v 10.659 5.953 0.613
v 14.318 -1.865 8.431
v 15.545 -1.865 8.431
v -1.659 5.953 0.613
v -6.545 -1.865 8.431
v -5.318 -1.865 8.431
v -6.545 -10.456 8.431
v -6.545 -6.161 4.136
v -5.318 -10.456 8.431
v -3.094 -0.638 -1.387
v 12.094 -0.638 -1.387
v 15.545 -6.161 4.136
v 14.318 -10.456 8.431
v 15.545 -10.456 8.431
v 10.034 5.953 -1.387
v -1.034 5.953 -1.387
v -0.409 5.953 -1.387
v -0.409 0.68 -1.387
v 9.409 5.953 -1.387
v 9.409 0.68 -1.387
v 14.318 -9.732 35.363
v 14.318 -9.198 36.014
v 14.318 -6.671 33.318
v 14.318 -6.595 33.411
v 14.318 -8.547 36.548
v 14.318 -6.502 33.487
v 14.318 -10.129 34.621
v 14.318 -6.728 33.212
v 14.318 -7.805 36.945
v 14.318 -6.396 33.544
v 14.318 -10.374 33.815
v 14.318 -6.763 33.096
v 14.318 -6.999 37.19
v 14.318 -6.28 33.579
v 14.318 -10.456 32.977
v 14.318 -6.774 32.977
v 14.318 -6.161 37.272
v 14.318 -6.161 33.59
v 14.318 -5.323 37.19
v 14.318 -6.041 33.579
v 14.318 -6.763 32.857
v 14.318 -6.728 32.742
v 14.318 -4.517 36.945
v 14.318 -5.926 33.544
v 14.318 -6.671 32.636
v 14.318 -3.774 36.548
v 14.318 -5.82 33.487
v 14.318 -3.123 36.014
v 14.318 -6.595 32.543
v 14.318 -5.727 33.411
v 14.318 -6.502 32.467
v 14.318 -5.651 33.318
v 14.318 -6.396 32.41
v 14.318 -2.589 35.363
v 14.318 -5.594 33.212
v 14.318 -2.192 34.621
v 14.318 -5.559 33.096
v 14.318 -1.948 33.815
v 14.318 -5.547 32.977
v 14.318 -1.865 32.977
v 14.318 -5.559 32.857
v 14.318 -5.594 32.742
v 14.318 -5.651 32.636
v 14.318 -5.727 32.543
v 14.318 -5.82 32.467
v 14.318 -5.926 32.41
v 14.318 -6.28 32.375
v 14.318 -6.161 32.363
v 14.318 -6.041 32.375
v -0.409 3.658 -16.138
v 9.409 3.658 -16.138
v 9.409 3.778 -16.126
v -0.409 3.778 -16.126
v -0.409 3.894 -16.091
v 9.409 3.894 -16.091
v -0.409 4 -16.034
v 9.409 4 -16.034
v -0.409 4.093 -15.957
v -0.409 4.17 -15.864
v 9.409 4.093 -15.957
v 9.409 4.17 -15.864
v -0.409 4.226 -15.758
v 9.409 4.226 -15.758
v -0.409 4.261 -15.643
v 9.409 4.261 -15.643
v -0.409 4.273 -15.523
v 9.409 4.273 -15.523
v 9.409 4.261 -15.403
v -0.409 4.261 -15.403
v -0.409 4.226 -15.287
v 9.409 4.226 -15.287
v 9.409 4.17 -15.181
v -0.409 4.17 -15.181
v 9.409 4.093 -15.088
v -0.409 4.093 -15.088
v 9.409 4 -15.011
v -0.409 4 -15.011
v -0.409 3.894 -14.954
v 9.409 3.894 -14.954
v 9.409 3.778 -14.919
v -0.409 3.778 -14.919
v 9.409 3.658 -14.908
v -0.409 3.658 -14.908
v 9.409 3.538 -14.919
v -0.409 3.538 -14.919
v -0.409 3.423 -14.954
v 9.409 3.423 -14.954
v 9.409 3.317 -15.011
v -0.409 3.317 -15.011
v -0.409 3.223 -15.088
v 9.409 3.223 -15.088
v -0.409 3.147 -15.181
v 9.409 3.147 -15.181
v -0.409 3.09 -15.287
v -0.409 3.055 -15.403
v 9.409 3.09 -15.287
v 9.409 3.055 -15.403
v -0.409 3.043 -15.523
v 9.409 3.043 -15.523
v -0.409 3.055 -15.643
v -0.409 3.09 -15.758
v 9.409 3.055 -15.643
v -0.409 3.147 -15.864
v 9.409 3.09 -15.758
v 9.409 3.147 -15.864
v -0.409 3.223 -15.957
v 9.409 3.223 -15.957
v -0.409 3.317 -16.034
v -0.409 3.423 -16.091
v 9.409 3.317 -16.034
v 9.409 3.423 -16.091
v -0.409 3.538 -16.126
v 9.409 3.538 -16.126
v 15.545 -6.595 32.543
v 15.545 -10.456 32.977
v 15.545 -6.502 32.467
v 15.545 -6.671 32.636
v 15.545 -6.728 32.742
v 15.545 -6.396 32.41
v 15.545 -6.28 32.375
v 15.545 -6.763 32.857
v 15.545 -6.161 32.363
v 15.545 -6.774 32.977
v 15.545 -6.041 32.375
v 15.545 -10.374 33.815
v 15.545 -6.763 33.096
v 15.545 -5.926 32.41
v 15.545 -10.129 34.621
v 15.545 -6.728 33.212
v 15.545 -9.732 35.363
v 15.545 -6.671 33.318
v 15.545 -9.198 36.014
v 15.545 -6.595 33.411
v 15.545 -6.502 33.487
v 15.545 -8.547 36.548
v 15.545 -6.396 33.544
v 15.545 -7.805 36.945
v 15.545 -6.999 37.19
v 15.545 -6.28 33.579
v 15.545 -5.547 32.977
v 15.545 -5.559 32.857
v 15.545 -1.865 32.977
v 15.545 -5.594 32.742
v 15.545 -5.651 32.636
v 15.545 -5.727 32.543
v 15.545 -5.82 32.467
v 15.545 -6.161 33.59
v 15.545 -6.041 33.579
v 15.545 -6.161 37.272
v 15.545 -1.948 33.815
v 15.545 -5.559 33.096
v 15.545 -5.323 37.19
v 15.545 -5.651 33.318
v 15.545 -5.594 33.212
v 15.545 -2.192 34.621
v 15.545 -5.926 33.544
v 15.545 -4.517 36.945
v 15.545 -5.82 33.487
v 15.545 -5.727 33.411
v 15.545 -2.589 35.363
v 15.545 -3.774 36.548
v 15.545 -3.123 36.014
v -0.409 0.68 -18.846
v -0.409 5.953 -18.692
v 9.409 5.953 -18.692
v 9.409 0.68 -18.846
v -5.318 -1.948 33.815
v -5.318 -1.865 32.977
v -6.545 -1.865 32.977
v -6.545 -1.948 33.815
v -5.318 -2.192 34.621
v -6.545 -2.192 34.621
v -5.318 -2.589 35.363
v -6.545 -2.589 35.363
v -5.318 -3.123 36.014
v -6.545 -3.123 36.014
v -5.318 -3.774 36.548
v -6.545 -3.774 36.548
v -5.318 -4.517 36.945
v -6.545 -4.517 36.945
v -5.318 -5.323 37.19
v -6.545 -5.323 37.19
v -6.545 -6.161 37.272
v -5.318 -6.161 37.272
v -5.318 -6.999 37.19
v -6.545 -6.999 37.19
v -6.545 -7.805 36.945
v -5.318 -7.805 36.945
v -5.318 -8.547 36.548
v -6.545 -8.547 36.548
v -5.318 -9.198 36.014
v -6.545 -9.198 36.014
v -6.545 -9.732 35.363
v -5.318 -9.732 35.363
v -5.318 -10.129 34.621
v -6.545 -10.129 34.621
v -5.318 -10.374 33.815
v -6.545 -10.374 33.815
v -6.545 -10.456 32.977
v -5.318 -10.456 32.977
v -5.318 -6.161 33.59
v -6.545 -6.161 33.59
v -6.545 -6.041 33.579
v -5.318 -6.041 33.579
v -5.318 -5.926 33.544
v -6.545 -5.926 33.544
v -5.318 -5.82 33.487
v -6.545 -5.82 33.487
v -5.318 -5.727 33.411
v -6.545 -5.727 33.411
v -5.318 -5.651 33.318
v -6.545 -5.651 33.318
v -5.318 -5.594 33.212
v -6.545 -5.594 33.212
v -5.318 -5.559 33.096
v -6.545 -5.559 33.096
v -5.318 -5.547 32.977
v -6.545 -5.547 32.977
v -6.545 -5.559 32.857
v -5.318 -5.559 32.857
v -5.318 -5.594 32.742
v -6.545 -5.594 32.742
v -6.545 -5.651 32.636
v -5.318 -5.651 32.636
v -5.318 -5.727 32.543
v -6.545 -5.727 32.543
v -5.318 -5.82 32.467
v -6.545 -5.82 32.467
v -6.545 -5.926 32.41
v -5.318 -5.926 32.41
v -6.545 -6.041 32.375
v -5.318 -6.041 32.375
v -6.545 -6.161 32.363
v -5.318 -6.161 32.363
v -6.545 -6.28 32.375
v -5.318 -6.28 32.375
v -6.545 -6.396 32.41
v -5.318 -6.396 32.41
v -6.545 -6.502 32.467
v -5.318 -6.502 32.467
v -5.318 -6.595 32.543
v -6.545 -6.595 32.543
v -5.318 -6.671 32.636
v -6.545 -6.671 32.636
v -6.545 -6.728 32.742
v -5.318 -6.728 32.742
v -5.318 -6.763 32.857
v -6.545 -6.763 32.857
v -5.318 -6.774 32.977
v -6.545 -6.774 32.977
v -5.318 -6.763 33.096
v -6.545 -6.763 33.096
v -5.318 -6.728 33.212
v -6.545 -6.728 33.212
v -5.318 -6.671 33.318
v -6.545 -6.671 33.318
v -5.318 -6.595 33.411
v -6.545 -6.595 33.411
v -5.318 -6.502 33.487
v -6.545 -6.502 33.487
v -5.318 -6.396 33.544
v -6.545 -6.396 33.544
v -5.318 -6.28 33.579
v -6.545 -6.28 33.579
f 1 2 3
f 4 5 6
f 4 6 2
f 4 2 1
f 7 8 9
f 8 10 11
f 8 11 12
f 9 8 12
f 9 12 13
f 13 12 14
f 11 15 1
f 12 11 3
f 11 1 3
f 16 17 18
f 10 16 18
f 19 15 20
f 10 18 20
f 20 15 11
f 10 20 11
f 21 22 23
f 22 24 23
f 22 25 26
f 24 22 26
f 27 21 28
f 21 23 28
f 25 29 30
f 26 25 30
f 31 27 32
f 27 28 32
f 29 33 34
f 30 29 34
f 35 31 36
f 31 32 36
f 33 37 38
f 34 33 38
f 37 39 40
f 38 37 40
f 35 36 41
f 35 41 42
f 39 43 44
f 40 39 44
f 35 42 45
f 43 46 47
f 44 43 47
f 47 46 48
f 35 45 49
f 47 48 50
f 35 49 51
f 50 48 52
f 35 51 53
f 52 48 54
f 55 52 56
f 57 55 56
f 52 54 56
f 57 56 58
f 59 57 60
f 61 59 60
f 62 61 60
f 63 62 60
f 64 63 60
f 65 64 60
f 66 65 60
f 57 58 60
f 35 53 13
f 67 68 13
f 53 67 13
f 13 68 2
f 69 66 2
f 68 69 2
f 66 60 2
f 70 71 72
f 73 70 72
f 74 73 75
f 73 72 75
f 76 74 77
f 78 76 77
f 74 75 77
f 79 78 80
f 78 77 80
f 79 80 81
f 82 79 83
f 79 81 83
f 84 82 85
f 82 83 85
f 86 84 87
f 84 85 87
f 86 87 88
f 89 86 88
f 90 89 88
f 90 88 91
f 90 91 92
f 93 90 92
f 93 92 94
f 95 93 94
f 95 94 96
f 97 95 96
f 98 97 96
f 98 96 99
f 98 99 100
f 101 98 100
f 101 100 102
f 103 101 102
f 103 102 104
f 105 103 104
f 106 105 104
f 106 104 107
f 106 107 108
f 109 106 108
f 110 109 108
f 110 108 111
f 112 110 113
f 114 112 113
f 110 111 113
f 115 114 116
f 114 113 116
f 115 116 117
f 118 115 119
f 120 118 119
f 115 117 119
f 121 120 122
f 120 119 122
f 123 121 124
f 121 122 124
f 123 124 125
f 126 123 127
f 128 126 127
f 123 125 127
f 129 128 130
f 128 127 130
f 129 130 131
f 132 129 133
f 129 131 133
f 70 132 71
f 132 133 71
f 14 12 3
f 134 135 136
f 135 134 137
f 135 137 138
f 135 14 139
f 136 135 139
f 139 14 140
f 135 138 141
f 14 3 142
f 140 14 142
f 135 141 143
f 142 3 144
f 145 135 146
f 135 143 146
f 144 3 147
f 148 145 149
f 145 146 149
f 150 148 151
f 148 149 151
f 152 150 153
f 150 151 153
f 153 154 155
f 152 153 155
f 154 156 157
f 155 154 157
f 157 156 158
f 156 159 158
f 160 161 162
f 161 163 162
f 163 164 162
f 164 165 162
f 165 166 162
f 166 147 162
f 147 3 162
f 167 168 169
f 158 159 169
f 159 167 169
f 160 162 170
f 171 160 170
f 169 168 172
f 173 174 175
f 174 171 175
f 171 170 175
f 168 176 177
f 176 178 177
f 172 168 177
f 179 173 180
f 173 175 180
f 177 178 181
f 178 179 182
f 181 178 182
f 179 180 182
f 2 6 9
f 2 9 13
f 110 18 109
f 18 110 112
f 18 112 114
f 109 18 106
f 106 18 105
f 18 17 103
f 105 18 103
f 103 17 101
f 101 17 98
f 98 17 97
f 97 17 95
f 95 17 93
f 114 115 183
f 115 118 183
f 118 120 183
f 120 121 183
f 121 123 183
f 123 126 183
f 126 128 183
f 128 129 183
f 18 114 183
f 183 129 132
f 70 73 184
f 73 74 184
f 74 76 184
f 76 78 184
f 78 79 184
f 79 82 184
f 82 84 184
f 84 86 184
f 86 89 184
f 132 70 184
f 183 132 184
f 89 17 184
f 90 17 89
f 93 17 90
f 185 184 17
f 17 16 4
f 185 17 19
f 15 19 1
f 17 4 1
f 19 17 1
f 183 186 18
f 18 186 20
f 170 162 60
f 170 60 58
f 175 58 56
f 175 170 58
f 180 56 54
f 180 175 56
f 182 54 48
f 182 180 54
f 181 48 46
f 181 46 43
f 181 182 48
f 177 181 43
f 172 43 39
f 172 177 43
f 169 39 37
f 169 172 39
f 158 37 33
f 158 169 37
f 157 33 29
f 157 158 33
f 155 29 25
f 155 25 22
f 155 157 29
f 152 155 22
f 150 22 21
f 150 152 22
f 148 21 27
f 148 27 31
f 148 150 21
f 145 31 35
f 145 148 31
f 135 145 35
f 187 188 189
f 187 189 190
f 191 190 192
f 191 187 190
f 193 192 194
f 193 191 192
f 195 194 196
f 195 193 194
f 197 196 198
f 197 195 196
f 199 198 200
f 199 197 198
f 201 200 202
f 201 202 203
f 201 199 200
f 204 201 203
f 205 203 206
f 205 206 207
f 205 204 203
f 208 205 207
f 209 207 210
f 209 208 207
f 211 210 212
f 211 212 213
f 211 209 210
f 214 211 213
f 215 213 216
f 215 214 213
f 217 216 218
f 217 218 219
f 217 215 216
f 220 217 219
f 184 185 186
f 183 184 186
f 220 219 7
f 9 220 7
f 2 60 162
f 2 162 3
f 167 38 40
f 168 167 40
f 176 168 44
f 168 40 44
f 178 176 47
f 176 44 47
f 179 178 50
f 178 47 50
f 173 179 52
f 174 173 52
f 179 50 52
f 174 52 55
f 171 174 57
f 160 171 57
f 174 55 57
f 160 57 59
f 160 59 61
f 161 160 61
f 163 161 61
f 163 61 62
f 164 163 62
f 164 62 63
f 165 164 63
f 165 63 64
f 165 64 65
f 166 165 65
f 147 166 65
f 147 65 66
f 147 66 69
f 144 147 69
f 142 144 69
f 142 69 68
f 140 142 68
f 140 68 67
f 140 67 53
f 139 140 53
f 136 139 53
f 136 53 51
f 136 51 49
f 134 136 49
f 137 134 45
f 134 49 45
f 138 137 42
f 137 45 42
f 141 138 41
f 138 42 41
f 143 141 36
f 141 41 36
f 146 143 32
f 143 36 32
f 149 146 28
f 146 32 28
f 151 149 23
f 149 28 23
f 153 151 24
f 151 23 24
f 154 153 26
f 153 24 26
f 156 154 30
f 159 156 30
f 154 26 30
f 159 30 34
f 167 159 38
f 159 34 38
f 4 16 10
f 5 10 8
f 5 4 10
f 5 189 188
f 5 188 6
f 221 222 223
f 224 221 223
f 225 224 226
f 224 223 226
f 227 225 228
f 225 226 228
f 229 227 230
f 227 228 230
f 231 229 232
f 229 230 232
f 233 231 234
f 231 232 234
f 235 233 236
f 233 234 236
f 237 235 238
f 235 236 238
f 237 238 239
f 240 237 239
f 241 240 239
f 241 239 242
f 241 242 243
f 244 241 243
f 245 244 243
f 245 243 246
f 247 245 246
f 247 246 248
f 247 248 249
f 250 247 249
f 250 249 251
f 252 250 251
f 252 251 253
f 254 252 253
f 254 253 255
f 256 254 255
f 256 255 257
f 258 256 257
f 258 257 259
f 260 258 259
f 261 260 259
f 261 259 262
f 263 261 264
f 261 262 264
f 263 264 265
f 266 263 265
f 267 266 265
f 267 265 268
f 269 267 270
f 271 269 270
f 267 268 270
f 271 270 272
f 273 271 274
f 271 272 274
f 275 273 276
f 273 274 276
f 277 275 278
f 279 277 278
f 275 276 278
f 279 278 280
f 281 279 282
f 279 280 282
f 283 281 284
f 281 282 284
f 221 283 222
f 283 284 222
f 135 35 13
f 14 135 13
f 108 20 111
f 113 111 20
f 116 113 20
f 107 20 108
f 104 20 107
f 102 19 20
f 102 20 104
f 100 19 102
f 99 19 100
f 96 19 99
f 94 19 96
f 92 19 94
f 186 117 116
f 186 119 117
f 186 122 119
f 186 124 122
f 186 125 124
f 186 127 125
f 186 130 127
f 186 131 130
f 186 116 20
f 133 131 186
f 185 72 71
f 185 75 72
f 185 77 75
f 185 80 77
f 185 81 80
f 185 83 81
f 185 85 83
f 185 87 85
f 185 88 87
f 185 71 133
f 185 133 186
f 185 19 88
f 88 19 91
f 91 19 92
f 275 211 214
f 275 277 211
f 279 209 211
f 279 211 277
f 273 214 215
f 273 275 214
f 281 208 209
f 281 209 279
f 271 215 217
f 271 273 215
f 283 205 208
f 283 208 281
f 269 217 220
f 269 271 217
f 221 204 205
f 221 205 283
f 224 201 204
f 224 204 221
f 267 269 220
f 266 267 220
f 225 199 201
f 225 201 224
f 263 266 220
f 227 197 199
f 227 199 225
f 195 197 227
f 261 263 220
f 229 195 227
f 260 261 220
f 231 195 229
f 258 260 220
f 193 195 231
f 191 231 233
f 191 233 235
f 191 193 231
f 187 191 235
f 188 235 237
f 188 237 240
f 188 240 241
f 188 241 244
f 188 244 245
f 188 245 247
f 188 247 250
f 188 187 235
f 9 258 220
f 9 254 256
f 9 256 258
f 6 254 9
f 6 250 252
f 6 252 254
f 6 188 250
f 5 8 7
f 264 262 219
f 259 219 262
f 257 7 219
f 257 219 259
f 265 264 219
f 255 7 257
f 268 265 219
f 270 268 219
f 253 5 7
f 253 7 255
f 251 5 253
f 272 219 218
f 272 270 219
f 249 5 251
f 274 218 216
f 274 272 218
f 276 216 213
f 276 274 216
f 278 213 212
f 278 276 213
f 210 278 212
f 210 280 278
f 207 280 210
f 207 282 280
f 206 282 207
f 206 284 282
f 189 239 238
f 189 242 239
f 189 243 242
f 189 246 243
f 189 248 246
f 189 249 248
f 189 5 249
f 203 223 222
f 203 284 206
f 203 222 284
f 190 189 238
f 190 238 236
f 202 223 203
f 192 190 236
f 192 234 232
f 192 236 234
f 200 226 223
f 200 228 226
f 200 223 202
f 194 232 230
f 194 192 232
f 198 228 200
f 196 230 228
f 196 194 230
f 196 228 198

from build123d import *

# Parameters (mm, degrees)
SKETCH_1_W               = 20
SKETCH_1_H               = 10
EXTRUDE_1_DEPTH          = 9
CUT_EXTRUDE_3_DEPTH      = 9
CUT_EXTRUDE_4_DEPTH      = 18.52868966
CUT_EXTRUDE_4_DEPTH_BACK = 9
EXTRUDE_2_DEPTH          = 9
EXTRUDE_3_DEPTH          = 9
SKETCH_10_W              = 8
SKETCH_10_H              = 13
CUT_EXTRUDE_5_DEPTH      = 9
SKETCH_12_W              = 2.5
SKETCH_12_H              = 12
CUT_EXTRUDE_6_DEPTH      = 9
SKETCH_13_W              = 2.5
SKETCH_13_H              = 7.75
CUT_EXTRUDE_7_DEPTH      = 9
CUT_EXTRUDE_8_DEPTH      = 9
CUT_EXTRUDE_9_DEPTH      = 9
SKETCH_26_R              = 0.25
CUT_EXTRUDE_16_DEPTH     = 19.638541659
SCALE_1_SCALE            = 2.454545455
SKETCH_29_W              = 19.36913475
SKETCH_29_H              = 8.233667945
CUT_EXTRUDE_17_DEPTH     = 35.391743647
CUT_EXTRUDE_18_DEPTH     = 10
SKETCH_34_R              = 0.615
CUT_EXTRUDE_19_DEPTH     = 10
CUT_EXTRUDE_20_DEPTH     = 10


with BuildPart() as part:
    # 草图1 → 凸台-拉伸1 (new body)
    with BuildSketch(Plane(origin=(0, 0, 0), x_dir=(0, 0, -1), z_dir=(1, 0, 0))):
        with Locations((-3.964524465, 0.58990319)):
            Rectangle(SKETCH_1_W, SKETCH_1_H)
    extrude(amount=EXTRUDE_1_DEPTH)

    # 草图2 → 切除-拉伸3 (cut)
    with BuildSketch(Plane(origin=(9, 0, 0), x_dir=(0, 0, -1), z_dir=(1, 0, 0))):
        Polygon((0.035475535, -0.41009681), (-3.964524465, -4.41009681), (6.035475535, -4.41009681), (6.035475535, -0.410096535), align=None)
    extrude(amount=-CUT_EXTRUDE_3_DEPTH, mode=Mode.SUBTRACT)

    # 草图6 → 切除-拉伸4 (cut, two sides: drawn at the far end of the back side and taken through both)
    with BuildSketch(Plane(origin=(9, 0, 0), x_dir=(0, 0, -1), z_dir=(1, 0, 0)).offset(-CUT_EXTRUDE_4_DEPTH_BACK)):
        Polygon((-66.684543288, -0.910096672), (-13.964524465, -0.910096672), (-3.964524465, -0.910096672), (0.035475535, 3.089903328), (6.035475535, 3.089903328), (58.755494358, 3.089903328), (55.394957379, 108.476374614), (-70.045080267, 104.476374614), align=None)
    extrude(amount=CUT_EXTRUDE_4_DEPTH + CUT_EXTRUDE_4_DEPTH_BACK, mode=Mode.SUBTRACT)

    # 草图8 → 凸台-拉伸2 (add)
    with BuildSketch(Plane(origin=(9, 0, 0), x_dir=(0, 0, -1), z_dir=(1, 0, 0))):
        with BuildLine():
            Line((-13.964524465, -4.41009681), (-13.964524465, -0.910096672))
            ThreePointArc((-13.964524465, -0.910096672), (-15.714524534, -2.660096741), (-13.964524465, -4.41009681))
        make_face()
    extrude(amount=-EXTRUDE_2_DEPTH)

    # 草图9 → 凸台-拉伸3 (add)
    with BuildSketch(Plane(origin=(9, 0, 0), x_dir=(0, 0, -1), z_dir=(1, 0, 0))):
        with BuildLine():
            Line((6.035475535, -0.410096672), (6.035475535, 3.089903328))
            ThreePointArc((6.035475535, 3.089903328), (7.785475535, 1.339903328), (6.035475535, -0.410096672))
        make_face()
    extrude(amount=-EXTRUDE_3_DEPTH)

    # 草图10 → 切除-拉伸5 (cut)
    with BuildSketch(Plane(origin=(0, -0.910096672, 0), x_dir=(1, 0, 0), z_dir=(0, 1, 0))):
        with Locations((4.5, -10.464524465)):
            Rectangle(SKETCH_10_W, SKETCH_10_H)
    extrude(amount=-CUT_EXTRUDE_5_DEPTH, mode=Mode.SUBTRACT)

    # 草图12 → 切除-拉伸6 (cut)
    with BuildSketch(Plane(origin=(0, 3.089903328, 0), x_dir=(1, 0, 0), z_dir=(0, 1, 0))):
        with Locations((7.75, 6.035475535)):
            Rectangle(SKETCH_12_W, SKETCH_12_H)
    extrude(amount=-CUT_EXTRUDE_6_DEPTH, mode=Mode.SUBTRACT)

    # 草图13 → 切除-拉伸7 (cut)
    with BuildSketch(Plane(origin=(0, 3.089903328, 0), x_dir=(1, 0, 0), z_dir=(0, 1, 0))):
        with Locations((1.25, 3.910475535)):
            Rectangle(SKETCH_13_W, SKETCH_13_H)
    extrude(amount=-CUT_EXTRUDE_7_DEPTH, mode=Mode.SUBTRACT)

    # 草图14 → 切除-拉伸8 (cut)
    with BuildSketch(Plane(origin=(0, 1.527213896, 1.527213896), x_dir=(1, 0, 0), z_dir=(0, 0.7071067811865477, 0.7071067811865475))):
        Polygon((2.5, 2.209976588), (0, -3.446877662), (-6.872938914, -0.617067375), (-4.372938914, 5.039786874), align=None)
    extrude(amount=-CUT_EXTRUDE_8_DEPTH, mode=Mode.SUBTRACT)

    # 草图15 → 切除-拉伸9 (cut)
    with BuildSketch(Plane(origin=(0, 1.527213896, 1.527213896), x_dir=(1, 0, 0), z_dir=(0, 0.7071067811865477, 0.7071067811865475))):
        Polygon((6.5, 2.209976588), (9, -3.446877662), (12.673354488, 0), (10.173354488, 5.656854249), align=None)
    extrude(amount=-CUT_EXTRUDE_9_DEPTH, mode=Mode.SUBTRACT)

    # 草图26 → 切除-拉伸16 (cut, through all)
    with BuildSketch(Plane.ZY):
        with Locations((13.964524465, -2.660096741)):
            Circle(SKETCH_26_R)
    extrude(amount=-CUT_EXTRUDE_16_DEPTH, mode=Mode.SUBTRACT)


with BuildPart() as part_1:
    # 缩放比例1: scaled about (4.5, -0.253377538, 0.893630972)
    add(part.part.scale(SCALE_1_SCALE).moved(Location((-6.545454545, 0.368549146, -1.299826868))))

    # 草图29 → 切除-拉伸17 (cut, through all)
    with BuildSketch(Plane.XY.offset(8.431278652)):
        with Locations((4.462607848, 10.069691287)):
            Rectangle(SKETCH_29_W, SKETCH_29_H)
    extrude(amount=-CUT_EXTRUDE_17_DEPTH, mode=Mode.SUBTRACT)

    # 草图31 → 切除-拉伸18 (cut)
    with BuildSketch(Plane(origin=(9.409090909, 0, 0), x_dir=(0, 0, -1), z_dir=(1, 0, 0))):
        with BuildLine():
            Line((19.210193521, 0.679886253), (1.386903166, 0.679886253))
            Line((1.386903166, 0.679886253), (1.386903166, -0.638052115))
            Line((1.386903166, -0.638052115), (16.114175893, -0.638051777))
            ThreePointArc((16.114175893, -0.638051777), (17.796606115, -0.29485713), (19.210193521, 0.679886253))
        make_face()
    extrude(amount=-CUT_EXTRUDE_18_DEPTH, mode=Mode.SUBTRACT)

    # 草图34 → 切除-拉伸19 (cut)
    with BuildSketch(Plane(origin=(9.409090909, 0, 0), x_dir=(0, 0, -1), z_dir=(1, 0, 0))):
        with Locations((15.522596163, 3.658191587)):
            Circle(SKETCH_34_R)
    extrude(amount=-CUT_EXTRUDE_19_DEPTH, mode=Mode.SUBTRACT)

    # 草图35 → 切除-拉伸20 (cut)
    with BuildSketch(Plane(origin=(9.409090909, 0, 0), x_dir=(0, 0, -1), z_dir=(1, 0, 0))):
        Polygon((18.603278237, 9.002231919), (19.169117802, -10.424926464), (26.96512958, -9.984829025), (26.399290016, 9.442329358), align=None)
    extrude(amount=-CUT_EXTRUDE_20_DEPTH, mode=Mode.SUBTRACT)


solid = part_1.part
